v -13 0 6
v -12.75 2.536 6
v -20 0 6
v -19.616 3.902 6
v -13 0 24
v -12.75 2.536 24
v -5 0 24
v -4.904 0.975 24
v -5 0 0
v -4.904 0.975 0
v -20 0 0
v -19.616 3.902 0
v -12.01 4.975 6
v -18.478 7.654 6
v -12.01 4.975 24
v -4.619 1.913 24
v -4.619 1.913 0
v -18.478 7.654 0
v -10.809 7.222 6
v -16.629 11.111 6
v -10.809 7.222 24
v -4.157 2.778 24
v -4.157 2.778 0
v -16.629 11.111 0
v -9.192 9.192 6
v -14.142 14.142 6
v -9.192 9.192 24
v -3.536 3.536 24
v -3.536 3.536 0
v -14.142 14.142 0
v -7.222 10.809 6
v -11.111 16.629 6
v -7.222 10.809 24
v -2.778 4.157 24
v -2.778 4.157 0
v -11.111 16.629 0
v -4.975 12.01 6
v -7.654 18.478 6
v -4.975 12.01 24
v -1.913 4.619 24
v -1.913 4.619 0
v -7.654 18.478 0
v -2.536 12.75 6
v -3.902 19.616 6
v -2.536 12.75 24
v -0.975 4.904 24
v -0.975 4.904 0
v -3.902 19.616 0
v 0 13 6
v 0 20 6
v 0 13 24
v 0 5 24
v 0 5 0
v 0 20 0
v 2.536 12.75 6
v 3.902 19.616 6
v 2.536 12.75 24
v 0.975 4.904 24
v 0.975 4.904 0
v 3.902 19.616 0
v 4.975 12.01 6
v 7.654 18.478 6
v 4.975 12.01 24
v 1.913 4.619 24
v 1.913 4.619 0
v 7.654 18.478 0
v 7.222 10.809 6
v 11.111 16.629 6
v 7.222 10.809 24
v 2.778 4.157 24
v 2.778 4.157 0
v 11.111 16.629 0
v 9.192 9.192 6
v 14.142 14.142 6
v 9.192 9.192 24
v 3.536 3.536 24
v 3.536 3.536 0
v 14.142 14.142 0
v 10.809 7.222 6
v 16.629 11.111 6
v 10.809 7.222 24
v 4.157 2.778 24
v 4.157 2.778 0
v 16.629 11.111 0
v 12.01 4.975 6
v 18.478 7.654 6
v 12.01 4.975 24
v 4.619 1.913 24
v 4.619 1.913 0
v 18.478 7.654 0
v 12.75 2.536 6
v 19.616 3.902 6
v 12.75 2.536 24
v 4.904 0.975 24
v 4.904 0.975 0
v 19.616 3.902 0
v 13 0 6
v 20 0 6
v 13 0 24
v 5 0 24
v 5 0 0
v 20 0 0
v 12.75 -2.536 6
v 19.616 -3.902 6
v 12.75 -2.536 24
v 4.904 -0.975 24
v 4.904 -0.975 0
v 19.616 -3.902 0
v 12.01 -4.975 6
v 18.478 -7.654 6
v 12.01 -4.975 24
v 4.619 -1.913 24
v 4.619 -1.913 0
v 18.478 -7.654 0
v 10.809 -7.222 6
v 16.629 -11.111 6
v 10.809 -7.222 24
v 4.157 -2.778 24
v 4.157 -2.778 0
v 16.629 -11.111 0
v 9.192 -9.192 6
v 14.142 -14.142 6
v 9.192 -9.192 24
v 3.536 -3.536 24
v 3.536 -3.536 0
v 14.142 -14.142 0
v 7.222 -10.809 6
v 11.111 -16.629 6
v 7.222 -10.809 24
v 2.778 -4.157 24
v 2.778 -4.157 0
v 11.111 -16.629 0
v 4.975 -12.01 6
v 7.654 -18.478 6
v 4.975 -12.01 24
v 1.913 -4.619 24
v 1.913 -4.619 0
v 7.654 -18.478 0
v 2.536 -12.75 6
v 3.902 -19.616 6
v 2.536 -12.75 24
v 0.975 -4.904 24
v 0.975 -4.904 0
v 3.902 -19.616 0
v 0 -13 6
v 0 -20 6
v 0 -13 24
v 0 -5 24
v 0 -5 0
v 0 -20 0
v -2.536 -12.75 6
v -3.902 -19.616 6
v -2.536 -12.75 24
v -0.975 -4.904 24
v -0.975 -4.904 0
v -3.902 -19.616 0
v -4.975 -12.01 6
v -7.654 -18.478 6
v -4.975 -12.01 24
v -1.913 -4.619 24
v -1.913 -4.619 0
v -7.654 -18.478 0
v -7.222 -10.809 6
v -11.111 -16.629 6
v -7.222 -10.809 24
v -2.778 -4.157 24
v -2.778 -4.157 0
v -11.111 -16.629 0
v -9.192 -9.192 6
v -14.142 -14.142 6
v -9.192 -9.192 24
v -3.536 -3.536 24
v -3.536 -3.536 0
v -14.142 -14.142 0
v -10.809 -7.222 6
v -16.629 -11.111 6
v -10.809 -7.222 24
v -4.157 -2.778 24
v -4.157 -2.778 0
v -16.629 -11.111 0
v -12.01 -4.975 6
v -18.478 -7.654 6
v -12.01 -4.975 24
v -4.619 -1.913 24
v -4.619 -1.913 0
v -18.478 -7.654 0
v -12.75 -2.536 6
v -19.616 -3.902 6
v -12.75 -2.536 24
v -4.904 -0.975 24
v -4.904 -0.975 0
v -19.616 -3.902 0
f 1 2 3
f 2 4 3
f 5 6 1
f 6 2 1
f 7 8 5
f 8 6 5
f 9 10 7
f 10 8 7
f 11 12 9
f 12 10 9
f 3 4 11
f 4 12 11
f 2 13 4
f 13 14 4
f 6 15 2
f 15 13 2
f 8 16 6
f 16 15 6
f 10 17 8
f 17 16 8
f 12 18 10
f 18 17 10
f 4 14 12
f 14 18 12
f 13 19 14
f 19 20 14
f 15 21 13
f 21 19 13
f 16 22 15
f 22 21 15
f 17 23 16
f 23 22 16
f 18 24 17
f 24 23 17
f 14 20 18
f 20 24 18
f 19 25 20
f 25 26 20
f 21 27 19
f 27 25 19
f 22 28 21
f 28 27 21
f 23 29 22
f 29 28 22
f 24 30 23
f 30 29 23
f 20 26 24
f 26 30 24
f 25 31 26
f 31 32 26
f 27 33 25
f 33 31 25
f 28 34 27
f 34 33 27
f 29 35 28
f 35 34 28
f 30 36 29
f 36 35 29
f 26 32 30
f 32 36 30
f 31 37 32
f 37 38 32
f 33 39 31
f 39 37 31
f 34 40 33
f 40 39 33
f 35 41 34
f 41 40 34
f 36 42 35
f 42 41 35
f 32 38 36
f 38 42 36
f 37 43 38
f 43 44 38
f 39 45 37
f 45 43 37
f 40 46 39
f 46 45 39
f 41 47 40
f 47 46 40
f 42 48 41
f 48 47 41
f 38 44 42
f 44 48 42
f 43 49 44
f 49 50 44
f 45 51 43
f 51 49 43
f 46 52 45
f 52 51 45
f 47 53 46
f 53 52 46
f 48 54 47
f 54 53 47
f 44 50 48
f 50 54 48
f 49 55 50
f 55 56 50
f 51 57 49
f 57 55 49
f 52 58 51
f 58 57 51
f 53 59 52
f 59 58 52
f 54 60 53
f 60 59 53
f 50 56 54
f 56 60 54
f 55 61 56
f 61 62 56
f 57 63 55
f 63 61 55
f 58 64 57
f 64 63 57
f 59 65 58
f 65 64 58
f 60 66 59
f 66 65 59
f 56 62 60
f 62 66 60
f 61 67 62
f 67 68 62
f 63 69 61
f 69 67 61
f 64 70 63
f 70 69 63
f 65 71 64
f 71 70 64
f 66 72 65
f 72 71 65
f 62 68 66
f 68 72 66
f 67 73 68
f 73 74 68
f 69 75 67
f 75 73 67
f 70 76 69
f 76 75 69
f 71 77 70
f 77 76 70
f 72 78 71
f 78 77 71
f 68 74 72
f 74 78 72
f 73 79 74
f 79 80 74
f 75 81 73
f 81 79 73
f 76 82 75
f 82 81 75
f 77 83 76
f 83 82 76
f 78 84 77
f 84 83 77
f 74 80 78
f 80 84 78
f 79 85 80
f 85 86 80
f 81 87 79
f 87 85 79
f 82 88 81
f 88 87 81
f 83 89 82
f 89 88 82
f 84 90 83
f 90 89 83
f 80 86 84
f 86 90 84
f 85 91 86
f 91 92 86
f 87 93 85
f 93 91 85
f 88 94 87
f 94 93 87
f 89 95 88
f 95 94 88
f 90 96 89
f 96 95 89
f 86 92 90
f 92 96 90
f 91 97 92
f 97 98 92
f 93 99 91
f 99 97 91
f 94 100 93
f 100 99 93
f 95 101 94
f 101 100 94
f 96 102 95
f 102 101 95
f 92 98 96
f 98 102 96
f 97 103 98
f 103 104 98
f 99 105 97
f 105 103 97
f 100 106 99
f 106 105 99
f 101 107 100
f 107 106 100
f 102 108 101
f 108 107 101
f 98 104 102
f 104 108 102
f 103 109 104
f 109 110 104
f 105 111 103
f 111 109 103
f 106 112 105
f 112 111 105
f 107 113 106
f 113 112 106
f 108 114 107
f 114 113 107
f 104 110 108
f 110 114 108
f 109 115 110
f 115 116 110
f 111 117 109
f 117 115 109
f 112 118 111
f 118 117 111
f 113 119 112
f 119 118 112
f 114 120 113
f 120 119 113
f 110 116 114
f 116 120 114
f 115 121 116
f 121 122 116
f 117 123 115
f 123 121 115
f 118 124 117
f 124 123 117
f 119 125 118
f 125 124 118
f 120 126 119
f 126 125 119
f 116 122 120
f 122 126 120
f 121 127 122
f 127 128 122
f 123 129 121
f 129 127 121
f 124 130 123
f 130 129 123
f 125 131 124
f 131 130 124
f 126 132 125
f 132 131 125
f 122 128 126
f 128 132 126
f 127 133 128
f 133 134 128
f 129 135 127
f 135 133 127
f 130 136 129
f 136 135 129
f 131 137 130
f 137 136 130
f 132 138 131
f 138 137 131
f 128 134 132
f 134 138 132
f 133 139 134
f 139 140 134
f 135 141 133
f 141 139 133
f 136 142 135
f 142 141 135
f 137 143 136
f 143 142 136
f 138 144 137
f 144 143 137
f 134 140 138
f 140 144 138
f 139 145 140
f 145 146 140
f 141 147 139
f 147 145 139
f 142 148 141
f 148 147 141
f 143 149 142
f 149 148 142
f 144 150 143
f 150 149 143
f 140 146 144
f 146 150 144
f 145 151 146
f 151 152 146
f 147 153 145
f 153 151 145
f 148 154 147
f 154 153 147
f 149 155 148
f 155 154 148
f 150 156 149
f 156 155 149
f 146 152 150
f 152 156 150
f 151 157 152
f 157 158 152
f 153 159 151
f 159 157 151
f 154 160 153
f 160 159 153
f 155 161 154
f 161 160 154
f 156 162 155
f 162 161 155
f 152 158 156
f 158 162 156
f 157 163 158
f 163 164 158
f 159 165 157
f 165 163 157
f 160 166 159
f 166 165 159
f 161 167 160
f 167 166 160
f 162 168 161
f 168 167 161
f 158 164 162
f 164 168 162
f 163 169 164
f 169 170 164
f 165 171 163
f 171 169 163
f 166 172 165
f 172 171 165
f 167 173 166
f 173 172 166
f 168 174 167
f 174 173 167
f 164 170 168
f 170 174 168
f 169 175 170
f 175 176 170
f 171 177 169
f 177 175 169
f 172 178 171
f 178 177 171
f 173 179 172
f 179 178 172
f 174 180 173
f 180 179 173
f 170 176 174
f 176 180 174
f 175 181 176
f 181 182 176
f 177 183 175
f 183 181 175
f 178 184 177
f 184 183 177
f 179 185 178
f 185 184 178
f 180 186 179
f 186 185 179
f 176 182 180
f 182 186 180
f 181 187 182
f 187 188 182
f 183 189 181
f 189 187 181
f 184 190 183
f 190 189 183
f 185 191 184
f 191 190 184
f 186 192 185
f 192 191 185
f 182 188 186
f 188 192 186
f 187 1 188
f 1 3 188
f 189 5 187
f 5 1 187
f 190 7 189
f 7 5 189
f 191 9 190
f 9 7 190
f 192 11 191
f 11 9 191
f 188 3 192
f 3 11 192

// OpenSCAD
$fn = 32;

// ----------------------------------------------------------------------
// Arc stop: collar, 24 mm thick
// ----------------------------------------------------------------------

// --- parameters (mm) ---
revolve_angle = 360;      // full turn around the Z axis
profile_points = 6;       // points of the closed outline

profile = [[5, 0], [20, 0], [20, 6], [13, 6], [13, 24], [5, 24]];  // single closed polygon, 6 points, counter clockwise

// --- the one profile operation ---
rotate_extrude(angle = revolve_angle) polygon(points = profile);
